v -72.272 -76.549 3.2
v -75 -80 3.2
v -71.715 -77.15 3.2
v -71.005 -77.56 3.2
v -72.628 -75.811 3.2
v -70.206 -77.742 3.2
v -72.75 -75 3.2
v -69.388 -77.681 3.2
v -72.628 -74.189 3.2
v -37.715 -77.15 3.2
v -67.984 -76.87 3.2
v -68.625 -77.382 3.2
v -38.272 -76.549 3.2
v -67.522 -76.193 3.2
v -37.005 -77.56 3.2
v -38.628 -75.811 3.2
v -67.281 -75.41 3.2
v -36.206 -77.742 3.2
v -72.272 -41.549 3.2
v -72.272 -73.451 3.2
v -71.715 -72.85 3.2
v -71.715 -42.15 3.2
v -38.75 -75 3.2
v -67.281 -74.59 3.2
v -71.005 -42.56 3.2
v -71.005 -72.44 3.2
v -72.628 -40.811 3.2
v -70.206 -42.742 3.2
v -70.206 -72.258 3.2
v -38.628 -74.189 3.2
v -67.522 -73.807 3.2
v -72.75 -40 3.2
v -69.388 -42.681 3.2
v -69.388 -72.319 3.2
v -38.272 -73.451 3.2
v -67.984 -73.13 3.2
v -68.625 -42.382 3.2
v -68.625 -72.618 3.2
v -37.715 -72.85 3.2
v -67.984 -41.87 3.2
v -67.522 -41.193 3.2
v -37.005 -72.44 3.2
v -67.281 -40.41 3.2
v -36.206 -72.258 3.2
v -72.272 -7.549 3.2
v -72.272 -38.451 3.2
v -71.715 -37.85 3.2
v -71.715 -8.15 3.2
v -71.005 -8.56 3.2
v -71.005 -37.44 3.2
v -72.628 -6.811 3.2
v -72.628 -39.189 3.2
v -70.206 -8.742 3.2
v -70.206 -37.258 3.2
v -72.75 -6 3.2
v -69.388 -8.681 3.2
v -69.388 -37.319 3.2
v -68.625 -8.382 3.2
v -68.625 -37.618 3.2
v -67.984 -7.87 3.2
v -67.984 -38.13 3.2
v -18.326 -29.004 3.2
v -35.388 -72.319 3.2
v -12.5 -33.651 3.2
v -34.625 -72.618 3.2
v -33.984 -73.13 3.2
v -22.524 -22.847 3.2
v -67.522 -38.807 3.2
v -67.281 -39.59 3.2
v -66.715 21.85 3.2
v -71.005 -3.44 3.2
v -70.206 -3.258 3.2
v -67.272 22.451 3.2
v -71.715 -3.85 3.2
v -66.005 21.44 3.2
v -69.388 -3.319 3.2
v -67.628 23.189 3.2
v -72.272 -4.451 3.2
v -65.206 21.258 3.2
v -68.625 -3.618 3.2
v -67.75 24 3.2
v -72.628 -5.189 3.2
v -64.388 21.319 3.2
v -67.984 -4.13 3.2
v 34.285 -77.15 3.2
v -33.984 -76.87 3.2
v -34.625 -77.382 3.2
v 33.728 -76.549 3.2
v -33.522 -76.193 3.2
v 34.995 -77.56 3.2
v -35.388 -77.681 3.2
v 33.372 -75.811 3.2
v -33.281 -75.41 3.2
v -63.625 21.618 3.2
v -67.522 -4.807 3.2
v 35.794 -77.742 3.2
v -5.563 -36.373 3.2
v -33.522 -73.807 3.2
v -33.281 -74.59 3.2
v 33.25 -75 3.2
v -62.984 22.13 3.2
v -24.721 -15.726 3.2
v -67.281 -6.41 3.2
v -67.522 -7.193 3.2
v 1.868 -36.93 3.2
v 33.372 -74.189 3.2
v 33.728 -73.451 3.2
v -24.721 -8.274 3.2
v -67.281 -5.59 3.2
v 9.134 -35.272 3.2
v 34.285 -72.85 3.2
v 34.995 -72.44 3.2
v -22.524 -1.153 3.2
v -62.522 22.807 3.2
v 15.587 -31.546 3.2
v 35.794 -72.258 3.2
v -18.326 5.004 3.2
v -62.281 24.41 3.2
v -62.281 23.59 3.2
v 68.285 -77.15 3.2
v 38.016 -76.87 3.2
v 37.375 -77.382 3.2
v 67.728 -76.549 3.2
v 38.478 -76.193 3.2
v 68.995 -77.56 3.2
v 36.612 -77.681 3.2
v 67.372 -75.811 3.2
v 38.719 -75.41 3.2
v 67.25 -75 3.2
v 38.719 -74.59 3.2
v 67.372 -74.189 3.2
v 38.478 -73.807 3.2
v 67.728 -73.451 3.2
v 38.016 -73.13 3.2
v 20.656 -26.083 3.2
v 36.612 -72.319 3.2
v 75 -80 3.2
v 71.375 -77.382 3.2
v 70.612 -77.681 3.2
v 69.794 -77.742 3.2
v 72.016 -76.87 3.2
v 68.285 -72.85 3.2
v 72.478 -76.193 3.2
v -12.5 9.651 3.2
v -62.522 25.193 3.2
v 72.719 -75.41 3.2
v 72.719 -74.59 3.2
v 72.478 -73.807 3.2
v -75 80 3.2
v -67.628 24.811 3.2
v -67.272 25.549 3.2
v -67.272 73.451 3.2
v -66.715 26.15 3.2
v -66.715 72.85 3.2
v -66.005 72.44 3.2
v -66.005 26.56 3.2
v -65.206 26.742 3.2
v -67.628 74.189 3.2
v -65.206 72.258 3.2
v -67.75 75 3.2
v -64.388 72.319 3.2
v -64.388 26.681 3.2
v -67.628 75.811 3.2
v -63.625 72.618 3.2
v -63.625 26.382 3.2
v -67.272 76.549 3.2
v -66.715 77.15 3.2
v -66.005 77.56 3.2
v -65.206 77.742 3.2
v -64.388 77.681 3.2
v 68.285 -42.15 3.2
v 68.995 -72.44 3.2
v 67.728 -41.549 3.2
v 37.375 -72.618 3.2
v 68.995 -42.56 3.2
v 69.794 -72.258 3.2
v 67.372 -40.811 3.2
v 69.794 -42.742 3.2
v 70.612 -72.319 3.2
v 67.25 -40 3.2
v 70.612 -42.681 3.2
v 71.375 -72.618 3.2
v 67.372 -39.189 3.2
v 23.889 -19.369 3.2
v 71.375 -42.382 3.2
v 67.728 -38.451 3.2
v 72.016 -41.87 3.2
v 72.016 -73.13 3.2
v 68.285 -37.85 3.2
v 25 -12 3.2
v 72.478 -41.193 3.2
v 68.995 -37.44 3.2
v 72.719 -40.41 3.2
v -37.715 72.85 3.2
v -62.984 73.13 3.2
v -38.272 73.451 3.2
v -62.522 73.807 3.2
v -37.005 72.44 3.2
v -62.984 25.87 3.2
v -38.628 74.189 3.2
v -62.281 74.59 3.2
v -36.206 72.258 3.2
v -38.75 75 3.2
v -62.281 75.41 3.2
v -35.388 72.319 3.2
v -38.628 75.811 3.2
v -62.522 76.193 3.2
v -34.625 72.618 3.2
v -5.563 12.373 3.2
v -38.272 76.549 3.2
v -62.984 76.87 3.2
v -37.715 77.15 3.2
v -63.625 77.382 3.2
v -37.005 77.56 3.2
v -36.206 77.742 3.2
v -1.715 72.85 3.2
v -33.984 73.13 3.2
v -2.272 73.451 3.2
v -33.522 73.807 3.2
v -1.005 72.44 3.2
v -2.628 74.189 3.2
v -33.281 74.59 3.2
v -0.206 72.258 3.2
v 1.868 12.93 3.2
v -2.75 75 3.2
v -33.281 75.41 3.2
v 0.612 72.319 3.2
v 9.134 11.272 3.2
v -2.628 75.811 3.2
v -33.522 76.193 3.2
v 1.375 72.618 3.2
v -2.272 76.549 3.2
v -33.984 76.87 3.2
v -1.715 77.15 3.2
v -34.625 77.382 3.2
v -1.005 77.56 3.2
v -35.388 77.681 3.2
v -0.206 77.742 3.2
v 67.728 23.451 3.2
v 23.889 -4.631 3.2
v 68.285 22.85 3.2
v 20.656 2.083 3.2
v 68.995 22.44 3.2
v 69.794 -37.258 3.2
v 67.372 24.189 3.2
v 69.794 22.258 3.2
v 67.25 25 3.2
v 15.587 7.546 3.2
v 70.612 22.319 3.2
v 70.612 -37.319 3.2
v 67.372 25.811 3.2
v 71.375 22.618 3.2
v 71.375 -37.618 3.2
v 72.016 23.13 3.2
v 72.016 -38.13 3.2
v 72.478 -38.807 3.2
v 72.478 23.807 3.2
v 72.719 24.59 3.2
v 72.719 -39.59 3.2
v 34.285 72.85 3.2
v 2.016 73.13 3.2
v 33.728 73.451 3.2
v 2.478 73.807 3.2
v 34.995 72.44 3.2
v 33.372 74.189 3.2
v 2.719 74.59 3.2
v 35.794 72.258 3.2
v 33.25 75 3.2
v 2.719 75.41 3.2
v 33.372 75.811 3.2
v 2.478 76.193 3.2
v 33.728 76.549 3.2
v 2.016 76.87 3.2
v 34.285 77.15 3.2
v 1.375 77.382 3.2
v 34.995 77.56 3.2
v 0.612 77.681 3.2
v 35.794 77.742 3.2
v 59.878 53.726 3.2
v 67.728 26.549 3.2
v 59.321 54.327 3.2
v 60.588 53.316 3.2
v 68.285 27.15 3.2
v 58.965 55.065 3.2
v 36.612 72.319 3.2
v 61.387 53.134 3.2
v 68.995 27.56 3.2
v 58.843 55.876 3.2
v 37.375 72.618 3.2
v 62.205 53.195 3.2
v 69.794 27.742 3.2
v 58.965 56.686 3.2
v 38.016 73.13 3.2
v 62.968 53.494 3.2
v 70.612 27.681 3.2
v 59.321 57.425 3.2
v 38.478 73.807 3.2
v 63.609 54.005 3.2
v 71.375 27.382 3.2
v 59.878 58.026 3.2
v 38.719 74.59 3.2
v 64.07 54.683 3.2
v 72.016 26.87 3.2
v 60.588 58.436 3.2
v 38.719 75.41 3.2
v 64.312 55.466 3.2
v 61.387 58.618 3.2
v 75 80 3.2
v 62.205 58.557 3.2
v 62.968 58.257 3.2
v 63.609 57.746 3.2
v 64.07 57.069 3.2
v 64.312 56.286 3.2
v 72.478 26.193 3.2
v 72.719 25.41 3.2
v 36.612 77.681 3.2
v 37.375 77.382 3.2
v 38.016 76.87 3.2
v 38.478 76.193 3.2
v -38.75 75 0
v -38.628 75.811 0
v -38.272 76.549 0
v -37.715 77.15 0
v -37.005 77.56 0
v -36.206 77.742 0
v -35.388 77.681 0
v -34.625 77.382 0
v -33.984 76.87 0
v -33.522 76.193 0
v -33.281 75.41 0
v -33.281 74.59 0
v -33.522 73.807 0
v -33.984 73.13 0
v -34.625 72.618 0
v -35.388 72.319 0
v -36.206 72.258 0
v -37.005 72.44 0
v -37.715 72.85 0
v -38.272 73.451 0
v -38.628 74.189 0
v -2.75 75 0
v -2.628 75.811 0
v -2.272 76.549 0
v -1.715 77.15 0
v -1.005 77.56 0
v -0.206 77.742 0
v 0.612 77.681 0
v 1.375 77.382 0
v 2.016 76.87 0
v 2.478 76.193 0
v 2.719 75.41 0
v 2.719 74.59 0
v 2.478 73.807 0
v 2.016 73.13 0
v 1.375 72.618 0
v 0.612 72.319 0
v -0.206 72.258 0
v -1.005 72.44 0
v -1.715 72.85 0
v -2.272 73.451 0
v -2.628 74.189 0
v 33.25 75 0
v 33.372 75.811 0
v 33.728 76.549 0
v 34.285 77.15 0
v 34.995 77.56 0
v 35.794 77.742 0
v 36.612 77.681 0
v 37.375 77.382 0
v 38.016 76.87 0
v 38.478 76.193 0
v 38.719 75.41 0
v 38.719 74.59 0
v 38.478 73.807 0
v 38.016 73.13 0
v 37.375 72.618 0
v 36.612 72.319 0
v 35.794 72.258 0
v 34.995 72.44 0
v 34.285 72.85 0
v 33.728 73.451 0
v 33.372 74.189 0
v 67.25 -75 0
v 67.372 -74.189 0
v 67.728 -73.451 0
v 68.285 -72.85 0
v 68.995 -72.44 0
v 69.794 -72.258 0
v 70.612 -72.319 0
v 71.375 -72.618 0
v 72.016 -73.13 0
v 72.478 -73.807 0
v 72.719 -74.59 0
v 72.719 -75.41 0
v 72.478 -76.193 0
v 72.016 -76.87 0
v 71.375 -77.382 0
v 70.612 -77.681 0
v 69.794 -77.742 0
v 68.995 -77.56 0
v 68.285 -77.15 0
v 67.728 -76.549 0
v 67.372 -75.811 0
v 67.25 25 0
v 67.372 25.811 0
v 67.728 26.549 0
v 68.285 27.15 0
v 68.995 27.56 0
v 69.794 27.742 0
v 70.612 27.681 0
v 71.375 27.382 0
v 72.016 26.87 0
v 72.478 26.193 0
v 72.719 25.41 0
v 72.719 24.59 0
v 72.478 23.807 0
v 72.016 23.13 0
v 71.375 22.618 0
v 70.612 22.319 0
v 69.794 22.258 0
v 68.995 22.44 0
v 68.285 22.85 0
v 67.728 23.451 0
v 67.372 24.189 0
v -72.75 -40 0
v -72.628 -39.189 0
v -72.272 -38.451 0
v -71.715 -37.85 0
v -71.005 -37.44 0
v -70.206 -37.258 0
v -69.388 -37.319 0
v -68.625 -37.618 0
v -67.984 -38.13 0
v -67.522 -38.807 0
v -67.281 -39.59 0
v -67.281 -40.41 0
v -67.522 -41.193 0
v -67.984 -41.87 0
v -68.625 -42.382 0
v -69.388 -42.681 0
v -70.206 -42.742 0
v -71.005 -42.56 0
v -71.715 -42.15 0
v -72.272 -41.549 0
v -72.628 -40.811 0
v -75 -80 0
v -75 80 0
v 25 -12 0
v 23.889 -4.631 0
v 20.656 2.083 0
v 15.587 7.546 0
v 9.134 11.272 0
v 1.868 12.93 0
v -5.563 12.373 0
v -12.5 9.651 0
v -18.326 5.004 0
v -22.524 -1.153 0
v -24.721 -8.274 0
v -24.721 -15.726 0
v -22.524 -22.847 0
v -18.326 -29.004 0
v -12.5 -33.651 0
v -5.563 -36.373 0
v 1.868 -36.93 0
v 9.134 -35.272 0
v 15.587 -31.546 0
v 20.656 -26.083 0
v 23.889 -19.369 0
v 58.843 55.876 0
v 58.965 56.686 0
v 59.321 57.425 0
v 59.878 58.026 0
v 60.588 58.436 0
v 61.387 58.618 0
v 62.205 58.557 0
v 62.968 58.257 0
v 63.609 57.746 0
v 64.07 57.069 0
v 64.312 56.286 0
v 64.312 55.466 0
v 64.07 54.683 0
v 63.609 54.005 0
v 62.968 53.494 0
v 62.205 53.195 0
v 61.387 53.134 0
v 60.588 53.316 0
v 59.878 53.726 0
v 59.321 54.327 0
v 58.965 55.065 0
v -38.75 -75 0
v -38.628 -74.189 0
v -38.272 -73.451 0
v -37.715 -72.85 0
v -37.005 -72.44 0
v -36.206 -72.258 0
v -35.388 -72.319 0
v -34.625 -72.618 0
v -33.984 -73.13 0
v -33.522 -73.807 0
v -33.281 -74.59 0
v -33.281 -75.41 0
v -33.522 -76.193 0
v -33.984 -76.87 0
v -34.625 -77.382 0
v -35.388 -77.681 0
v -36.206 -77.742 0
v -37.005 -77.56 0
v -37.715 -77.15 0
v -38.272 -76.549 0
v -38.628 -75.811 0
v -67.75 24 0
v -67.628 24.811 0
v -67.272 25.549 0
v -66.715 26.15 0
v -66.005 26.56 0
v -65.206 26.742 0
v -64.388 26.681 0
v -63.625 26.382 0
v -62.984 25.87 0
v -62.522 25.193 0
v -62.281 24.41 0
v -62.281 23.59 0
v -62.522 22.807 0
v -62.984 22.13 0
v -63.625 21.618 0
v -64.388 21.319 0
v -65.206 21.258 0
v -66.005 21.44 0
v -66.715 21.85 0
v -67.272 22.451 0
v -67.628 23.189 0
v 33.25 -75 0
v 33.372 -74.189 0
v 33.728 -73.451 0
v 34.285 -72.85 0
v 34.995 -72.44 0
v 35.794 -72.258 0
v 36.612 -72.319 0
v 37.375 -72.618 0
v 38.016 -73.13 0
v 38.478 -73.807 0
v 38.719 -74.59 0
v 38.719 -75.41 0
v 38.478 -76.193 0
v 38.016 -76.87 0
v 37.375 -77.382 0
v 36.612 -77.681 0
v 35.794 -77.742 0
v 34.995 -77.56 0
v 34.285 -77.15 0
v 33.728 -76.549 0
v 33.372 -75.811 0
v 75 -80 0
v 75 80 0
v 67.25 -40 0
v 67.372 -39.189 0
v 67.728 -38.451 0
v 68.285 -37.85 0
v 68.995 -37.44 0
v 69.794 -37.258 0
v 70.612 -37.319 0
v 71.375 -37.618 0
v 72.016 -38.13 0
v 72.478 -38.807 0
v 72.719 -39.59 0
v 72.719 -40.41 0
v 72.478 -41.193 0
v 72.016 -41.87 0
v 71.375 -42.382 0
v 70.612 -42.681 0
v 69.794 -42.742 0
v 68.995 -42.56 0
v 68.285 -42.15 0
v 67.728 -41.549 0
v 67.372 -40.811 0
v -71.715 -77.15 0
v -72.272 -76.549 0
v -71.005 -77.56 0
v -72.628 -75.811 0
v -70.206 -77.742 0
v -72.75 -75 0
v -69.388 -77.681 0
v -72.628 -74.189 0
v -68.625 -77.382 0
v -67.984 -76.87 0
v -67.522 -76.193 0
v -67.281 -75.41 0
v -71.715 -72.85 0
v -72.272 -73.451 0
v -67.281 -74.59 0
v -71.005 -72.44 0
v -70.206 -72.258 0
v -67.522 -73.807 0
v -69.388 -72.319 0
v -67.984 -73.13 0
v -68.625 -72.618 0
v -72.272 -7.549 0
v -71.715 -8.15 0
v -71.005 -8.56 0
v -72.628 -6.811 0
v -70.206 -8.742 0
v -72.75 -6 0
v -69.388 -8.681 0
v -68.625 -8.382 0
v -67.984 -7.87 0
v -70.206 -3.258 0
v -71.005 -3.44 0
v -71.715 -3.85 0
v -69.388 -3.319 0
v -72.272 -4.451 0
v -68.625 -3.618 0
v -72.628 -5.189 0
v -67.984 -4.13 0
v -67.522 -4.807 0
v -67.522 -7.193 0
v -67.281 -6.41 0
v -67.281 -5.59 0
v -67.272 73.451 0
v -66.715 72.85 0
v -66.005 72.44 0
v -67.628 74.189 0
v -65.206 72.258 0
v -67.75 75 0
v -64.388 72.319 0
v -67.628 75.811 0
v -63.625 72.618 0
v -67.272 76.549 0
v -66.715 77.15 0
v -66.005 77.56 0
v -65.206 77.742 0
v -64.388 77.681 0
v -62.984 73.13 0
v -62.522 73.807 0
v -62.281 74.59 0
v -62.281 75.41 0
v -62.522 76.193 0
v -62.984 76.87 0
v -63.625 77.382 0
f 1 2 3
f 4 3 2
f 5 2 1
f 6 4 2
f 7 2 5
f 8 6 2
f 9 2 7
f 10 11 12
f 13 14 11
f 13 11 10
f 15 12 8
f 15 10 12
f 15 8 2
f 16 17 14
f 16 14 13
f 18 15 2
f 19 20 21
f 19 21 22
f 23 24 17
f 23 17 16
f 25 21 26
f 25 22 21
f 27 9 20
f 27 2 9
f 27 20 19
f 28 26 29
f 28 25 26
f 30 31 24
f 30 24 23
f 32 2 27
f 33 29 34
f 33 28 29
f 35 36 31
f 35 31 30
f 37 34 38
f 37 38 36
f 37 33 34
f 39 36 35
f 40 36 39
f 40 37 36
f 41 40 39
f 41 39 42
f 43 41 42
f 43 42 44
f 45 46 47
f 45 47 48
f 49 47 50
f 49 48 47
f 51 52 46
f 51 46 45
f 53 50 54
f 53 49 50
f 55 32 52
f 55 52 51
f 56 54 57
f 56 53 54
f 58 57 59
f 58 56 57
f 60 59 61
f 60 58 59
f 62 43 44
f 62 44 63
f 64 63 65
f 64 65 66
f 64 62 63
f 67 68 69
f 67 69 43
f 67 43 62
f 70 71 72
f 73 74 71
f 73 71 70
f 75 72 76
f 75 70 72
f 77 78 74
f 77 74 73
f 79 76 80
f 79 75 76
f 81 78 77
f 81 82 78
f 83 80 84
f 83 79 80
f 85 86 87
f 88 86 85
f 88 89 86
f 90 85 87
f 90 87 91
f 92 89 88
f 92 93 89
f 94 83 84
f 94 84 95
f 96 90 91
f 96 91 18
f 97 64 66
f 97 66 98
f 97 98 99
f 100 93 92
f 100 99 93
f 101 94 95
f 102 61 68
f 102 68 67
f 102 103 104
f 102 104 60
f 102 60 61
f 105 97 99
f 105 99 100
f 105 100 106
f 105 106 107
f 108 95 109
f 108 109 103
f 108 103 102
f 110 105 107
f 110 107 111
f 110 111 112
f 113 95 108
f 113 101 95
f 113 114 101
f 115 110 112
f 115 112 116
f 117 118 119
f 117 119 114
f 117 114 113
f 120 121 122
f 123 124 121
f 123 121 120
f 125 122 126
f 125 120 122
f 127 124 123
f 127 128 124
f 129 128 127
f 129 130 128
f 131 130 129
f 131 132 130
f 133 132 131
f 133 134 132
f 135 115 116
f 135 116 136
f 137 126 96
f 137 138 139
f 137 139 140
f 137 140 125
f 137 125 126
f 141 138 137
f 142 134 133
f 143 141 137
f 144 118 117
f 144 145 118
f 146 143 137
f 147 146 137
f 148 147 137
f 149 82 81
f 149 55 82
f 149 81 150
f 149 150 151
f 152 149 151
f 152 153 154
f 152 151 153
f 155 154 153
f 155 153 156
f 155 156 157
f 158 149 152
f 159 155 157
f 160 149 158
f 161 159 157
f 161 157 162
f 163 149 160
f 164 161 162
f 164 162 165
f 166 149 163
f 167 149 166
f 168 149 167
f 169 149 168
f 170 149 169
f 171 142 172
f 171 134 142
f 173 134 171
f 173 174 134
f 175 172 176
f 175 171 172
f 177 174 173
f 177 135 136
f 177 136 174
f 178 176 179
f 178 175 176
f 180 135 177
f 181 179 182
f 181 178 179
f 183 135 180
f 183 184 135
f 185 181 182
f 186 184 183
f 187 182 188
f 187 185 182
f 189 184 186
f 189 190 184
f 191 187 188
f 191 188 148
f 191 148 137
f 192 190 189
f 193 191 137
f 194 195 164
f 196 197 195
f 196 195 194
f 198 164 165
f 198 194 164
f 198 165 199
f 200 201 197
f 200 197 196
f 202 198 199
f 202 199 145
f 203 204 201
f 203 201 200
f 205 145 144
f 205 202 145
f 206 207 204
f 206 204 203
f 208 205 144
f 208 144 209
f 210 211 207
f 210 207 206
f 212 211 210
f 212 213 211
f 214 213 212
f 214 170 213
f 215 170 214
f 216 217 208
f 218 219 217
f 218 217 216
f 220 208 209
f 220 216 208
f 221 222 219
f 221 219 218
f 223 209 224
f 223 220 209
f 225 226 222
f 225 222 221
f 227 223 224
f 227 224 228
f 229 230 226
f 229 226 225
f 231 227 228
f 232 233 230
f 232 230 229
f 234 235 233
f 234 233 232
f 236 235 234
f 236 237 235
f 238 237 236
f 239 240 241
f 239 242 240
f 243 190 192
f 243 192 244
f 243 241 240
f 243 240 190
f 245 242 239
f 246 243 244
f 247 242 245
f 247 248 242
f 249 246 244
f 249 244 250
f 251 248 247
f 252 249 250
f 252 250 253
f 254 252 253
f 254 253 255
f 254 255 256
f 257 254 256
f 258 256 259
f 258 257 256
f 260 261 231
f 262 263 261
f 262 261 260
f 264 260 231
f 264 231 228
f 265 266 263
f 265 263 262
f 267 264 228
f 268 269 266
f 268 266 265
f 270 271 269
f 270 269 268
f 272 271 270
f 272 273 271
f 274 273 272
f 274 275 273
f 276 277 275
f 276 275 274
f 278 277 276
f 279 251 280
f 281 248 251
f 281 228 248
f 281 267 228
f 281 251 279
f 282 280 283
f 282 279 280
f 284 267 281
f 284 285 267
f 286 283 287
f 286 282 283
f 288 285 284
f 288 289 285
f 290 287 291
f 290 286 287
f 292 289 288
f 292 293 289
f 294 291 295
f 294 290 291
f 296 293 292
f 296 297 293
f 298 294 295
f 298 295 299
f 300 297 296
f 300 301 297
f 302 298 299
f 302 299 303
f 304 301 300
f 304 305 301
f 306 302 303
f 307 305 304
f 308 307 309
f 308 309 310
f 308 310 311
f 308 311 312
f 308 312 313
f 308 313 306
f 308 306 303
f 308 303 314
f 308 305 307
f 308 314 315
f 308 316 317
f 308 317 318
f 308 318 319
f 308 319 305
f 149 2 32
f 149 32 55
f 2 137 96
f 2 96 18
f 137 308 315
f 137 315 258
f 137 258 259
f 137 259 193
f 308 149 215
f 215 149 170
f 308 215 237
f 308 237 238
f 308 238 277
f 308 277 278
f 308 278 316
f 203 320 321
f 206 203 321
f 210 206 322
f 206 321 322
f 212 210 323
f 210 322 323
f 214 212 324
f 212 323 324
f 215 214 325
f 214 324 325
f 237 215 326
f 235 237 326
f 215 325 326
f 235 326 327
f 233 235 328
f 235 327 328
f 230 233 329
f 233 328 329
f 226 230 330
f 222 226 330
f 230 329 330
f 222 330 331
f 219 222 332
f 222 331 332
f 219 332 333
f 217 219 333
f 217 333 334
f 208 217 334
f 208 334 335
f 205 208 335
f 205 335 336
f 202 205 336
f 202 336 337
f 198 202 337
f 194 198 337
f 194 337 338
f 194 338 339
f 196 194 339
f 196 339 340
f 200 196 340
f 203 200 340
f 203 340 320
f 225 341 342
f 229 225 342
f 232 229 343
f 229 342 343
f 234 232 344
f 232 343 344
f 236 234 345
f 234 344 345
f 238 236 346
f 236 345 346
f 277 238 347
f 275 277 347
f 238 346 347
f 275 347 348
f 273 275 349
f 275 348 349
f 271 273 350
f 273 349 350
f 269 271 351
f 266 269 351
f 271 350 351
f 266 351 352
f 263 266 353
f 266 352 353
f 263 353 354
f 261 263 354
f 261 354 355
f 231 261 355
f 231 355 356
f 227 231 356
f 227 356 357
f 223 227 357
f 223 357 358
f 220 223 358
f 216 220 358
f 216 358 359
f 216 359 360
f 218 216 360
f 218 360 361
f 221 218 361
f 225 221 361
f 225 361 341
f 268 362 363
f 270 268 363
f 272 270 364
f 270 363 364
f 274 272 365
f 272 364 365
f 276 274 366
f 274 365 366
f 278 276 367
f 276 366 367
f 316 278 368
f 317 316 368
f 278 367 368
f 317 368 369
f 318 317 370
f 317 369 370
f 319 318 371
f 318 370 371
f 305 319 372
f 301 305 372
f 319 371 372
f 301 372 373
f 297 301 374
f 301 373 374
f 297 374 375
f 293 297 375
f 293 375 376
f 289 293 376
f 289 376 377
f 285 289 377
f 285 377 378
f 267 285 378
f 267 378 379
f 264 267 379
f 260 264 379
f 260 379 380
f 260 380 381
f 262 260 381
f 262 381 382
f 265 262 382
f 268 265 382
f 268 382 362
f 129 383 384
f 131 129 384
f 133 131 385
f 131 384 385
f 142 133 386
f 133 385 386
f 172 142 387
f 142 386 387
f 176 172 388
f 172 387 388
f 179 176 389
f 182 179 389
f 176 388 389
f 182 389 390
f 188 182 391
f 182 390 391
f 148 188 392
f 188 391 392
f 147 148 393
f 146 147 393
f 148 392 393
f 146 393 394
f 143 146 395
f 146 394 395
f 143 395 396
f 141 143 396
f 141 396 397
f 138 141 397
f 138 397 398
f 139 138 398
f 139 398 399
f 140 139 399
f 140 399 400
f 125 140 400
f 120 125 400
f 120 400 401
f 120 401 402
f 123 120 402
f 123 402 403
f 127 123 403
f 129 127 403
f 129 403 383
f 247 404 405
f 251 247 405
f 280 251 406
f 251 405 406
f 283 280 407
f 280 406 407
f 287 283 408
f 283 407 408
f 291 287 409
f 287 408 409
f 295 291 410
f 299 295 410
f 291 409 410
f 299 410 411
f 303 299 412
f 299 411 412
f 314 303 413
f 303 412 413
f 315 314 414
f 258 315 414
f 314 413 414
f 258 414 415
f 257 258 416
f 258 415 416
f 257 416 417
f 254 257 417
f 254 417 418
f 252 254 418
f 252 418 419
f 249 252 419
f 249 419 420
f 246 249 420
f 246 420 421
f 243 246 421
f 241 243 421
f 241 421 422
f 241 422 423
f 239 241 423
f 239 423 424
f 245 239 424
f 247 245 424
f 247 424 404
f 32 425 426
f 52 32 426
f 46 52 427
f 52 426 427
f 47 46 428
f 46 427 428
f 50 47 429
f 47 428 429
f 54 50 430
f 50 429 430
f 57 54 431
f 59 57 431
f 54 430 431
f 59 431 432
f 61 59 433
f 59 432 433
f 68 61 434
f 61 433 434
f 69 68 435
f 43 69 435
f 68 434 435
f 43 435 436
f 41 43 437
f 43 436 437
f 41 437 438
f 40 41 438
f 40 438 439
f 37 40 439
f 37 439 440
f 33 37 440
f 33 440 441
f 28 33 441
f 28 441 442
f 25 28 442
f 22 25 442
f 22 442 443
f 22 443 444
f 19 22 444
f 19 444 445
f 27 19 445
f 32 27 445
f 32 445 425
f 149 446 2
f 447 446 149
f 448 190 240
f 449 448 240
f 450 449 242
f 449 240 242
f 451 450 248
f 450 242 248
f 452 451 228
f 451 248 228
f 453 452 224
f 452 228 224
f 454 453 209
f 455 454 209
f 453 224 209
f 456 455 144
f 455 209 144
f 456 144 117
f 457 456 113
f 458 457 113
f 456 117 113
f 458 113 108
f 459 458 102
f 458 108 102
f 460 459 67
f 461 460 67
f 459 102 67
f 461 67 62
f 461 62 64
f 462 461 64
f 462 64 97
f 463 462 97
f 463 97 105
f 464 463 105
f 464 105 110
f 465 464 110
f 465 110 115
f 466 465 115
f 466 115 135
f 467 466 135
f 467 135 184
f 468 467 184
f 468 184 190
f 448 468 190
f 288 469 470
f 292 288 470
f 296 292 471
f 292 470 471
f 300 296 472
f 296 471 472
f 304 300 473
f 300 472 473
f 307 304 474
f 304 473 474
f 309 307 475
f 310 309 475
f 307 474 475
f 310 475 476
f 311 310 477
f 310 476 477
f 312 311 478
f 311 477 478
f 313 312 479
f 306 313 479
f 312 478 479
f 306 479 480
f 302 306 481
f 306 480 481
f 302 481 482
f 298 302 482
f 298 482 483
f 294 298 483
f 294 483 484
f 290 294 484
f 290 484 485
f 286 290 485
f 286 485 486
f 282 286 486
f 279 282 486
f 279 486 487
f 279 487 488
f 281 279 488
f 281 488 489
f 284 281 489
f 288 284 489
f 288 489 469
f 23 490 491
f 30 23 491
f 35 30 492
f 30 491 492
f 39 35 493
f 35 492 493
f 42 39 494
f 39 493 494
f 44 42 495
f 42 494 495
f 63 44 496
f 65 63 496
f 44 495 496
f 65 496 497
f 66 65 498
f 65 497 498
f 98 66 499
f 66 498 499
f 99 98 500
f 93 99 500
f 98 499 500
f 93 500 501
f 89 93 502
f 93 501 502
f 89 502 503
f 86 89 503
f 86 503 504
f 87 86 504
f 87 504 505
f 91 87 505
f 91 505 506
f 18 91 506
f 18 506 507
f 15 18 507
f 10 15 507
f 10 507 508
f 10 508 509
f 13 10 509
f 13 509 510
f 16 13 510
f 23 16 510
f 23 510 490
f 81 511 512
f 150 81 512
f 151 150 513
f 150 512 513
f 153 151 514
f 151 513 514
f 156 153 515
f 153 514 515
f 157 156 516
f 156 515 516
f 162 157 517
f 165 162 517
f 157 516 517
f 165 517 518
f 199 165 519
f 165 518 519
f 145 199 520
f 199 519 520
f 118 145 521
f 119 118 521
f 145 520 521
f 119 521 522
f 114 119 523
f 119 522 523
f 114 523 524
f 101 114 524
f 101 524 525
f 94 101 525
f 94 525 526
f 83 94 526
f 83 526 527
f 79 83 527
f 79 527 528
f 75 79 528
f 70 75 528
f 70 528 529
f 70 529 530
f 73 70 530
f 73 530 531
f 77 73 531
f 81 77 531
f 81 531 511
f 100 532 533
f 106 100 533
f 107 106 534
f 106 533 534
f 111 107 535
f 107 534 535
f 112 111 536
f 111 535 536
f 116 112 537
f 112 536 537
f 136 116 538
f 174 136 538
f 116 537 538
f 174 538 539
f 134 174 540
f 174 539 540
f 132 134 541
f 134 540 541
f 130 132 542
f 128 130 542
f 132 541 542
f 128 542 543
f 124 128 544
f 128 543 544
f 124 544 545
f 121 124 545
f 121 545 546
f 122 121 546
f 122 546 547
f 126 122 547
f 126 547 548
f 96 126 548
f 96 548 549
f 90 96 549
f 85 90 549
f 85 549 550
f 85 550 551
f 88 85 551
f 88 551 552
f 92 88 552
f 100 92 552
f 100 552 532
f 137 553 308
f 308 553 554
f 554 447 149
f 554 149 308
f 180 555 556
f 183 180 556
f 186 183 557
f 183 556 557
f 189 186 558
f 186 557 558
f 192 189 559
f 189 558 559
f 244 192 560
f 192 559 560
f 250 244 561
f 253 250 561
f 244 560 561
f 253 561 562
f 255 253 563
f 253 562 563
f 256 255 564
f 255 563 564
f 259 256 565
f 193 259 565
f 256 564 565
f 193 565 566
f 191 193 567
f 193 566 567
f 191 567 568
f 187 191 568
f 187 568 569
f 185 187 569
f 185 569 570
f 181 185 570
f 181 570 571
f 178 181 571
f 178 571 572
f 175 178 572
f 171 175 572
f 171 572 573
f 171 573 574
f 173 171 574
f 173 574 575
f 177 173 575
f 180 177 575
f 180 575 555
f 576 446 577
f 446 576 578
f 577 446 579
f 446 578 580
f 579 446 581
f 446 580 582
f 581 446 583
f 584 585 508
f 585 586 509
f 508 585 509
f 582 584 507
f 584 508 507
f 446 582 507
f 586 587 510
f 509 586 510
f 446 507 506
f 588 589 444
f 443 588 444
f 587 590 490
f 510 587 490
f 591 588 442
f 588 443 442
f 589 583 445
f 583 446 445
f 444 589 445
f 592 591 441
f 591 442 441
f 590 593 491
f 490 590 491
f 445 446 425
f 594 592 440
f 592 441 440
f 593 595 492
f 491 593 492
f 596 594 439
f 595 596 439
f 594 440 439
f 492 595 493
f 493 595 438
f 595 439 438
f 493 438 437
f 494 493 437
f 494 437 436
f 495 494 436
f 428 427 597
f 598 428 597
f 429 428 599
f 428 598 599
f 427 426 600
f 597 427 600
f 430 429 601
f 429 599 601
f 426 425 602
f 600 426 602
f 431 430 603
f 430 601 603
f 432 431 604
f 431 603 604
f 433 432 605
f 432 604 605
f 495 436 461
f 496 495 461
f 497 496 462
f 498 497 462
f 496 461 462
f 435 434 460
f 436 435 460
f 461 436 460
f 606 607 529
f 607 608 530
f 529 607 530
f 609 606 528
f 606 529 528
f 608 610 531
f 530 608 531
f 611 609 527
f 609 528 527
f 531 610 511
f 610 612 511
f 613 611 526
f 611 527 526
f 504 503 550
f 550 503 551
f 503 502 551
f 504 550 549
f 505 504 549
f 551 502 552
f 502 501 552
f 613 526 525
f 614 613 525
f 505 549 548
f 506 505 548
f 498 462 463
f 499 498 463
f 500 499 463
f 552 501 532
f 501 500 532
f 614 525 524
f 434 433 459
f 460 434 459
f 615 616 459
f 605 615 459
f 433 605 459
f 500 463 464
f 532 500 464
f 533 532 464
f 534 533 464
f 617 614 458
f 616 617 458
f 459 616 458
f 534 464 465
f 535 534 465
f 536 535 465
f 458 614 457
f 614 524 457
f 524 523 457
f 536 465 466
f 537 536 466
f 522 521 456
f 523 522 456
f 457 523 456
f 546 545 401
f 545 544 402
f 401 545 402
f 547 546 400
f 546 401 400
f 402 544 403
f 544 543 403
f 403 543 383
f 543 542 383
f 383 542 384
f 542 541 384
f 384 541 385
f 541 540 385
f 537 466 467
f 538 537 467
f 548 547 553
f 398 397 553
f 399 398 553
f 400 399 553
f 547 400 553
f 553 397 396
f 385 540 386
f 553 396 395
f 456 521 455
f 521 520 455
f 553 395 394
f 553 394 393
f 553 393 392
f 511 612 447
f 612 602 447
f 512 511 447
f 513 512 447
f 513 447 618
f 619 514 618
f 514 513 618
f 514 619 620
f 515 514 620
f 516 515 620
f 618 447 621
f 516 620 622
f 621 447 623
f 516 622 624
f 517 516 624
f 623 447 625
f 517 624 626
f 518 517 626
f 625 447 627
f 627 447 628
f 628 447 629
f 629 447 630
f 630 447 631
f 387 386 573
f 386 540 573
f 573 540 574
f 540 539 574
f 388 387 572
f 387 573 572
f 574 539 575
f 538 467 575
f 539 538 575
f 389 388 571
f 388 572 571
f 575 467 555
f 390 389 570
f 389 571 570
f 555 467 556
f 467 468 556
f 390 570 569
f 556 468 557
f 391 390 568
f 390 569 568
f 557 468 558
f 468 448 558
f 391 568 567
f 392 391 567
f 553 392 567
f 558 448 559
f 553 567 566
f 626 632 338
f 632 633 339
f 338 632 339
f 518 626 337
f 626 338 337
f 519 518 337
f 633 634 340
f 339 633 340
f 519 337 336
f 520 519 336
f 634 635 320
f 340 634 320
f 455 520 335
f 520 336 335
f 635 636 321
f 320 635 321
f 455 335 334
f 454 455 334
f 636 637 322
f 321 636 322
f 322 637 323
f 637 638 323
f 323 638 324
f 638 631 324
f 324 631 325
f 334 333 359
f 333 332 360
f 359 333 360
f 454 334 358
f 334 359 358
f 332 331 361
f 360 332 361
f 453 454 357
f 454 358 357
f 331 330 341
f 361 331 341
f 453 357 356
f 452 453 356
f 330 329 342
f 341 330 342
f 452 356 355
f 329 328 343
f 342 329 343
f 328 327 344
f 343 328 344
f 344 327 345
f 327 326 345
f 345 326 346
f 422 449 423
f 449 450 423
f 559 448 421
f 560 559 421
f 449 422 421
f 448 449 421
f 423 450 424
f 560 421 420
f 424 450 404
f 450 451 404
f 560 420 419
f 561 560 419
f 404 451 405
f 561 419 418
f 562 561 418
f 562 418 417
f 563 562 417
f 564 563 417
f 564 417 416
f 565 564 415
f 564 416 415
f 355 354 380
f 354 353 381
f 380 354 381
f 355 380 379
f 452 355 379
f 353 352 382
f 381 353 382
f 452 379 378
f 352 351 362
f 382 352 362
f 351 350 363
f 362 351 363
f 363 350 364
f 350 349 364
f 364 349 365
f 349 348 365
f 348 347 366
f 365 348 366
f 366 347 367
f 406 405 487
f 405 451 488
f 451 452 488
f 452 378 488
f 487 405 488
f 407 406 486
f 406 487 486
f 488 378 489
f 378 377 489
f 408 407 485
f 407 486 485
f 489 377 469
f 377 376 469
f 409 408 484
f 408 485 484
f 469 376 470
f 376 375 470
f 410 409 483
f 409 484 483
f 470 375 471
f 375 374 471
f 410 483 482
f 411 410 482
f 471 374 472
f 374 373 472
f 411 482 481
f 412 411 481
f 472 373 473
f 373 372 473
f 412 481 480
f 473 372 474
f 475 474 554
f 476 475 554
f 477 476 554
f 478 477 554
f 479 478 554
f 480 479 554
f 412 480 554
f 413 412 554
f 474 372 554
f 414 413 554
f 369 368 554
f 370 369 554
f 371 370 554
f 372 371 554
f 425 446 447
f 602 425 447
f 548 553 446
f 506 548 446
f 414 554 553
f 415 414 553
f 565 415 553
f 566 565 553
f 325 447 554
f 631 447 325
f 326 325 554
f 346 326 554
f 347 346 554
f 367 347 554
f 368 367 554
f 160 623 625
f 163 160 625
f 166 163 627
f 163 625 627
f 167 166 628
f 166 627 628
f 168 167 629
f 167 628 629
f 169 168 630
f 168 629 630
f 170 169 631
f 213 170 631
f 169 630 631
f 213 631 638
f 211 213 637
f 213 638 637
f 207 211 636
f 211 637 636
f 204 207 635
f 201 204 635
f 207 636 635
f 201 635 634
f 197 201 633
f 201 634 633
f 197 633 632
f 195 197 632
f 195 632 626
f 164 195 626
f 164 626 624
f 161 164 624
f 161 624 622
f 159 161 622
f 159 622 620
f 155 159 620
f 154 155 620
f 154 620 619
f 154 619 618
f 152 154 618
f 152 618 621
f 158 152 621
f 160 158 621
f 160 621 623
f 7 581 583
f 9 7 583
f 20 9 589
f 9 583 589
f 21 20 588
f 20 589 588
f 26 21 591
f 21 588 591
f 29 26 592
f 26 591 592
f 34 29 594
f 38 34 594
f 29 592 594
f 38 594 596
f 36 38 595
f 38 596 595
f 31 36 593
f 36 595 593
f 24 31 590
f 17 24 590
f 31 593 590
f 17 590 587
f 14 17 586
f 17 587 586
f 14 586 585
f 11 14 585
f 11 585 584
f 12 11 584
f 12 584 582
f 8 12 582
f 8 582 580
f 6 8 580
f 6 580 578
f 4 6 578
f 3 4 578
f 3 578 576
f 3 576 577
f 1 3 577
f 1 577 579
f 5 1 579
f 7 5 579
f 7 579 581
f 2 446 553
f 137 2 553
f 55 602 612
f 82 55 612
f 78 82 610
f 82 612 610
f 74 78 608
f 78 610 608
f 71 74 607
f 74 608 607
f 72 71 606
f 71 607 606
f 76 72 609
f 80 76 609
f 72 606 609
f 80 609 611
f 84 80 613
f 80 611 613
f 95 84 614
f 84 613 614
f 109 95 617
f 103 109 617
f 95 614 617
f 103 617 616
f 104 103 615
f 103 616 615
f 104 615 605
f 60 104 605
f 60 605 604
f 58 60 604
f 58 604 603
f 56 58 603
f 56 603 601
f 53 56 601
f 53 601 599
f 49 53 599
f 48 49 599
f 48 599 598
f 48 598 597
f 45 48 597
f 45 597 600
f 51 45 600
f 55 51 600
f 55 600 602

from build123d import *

# Parameters (mm, degrees)
SKETCH1_W           = 150
SKETCH1_H           = 160
BOSS_EXTRUDE1_DEPTH = 3.2
CUT_EXTRUDE1_REACH  = 5.2
SKETCH2_R           = 25
CUT_EXTRUDE2_REACH  = 5.2
SKETCH3_R           = 2.75


with BuildPart() as part:
    # Sketch1 → Boss-Extrude1 (new body)
    with BuildSketch(Plane.XY):
        Rectangle(SKETCH1_W, SKETCH1_H)
    extrude(amount=BOSS_EXTRUDE1_DEPTH)

    # Sketch2 → Cut-Extrude1 (cut, up to next)
    with BuildSketch(Plane.XY.offset(3.2), mode=Mode.PRIVATE) as cut_extrude1_sk1:
        with Locations((0, -12)):
            Circle(SKETCH2_R)
    cut_extrude1_tool1 = extrude(cut_extrude1_sk1.sketch, amount=-CUT_EXTRUDE1_REACH, mode=Mode.PRIVATE) & part.part
    add(cut_extrude1_tool1.solids().sort_by_distance((0, -12, 3.2))[0], mode=Mode.SUBTRACT)

    # Sketch3 → Cut-Extrude2 (cut, up to next)
    with BuildSketch(Plane(origin=(0, 0, 0), x_dir=(-1, 0, 0), z_dir=(0, 0, -1)), mode=Mode.PRIVATE) as cut_extrude2_sk1:
        with Locations((65, 24)):
            Circle(SKETCH3_R)
    cut_extrude2_tool1 = extrude(cut_extrude2_sk1.sketch, amount=-CUT_EXTRUDE2_REACH, mode=Mode.PRIVATE) & part.part
    add(cut_extrude2_tool1.solids().sort_by_distance((-65, 24, 0))[0], mode=Mode.SUBTRACT)
    # Sketch3 → Cut-Extrude2 (cut, up to next)
    with BuildSketch(Plane(origin=(0, 0, 0), x_dir=(-1, 0, 0), z_dir=(0, 0, -1)), mode=Mode.PRIVATE) as cut_extrude2_sk2:
        with Locations((-70, -75)):
            Circle(SKETCH3_R)
    cut_extrude2_tool2 = extrude(cut_extrude2_sk2.sketch, amount=-CUT_EXTRUDE2_REACH, mode=Mode.PRIVATE) & part.part
    add(cut_extrude2_tool2.solids().sort_by_distance((70, -75, 0))[0], mode=Mode.SUBTRACT)
    # Sketch3 → Cut-Extrude2 (cut, up to next)
    with BuildSketch(Plane(origin=(0, 0, 0), x_dir=(-1, 0, 0), z_dir=(0, 0, -1)), mode=Mode.PRIVATE) as cut_extrude2_sk3:
        with Locations((36, -75)):
            Circle(SKETCH3_R)
    cut_extrude2_tool3 = extrude(cut_extrude2_sk3.sketch, amount=-CUT_EXTRUDE2_REACH, mode=Mode.PRIVATE) & part.part
    add(cut_extrude2_tool3.solids().sort_by_distance((-36, -75, 0))[0], mode=Mode.SUBTRACT)
    # Sketch3 → Cut-Extrude2 (cut, up to next)
    with BuildSketch(Plane(origin=(0, 0, 0), x_dir=(-1, 0, 0), z_dir=(0, 0, -1)), mode=Mode.PRIVATE) as cut_extrude2_sk4:
        with Locations((-36, -75)):
            Circle(SKETCH3_R)
    cut_extrude2_tool4 = extrude(cut_extrude2_sk4.sketch, amount=-CUT_EXTRUDE2_REACH, mode=Mode.PRIVATE) & part.part
    add(cut_extrude2_tool4.solids().sort_by_distance((36, -75, 0))[0], mode=Mode.SUBTRACT)
    # Sketch3 → Cut-Extrude2 (cut, up to next)
    with BuildSketch(Plane(origin=(0, 0, 0), x_dir=(-1, 0, 0), z_dir=(0, 0, -1)), mode=Mode.PRIVATE) as cut_extrude2_sk5:
        with Locations((70, -75)):
            Circle(SKETCH3_R)
    cut_extrude2_tool5 = extrude(cut_extrude2_sk5.sketch, amount=-CUT_EXTRUDE2_REACH, mode=Mode.PRIVATE) & part.part
    add(cut_extrude2_tool5.solids().sort_by_distance((-70, -75, 0))[0], mode=Mode.SUBTRACT)
    # Sketch3 → Cut-Extrude2 (cut, up to next)
    with BuildSketch(Plane(origin=(0, 0, 0), x_dir=(-1, 0, 0), z_dir=(0, 0, -1)), mode=Mode.PRIVATE) as cut_extrude2_sk6:
        with Locations((-70, -40)):
            Circle(SKETCH3_R)
    cut_extrude2_tool6 = extrude(cut_extrude2_sk6.sketch, amount=-CUT_EXTRUDE2_REACH, mode=Mode.PRIVATE) & part.part
    add(cut_extrude2_tool6.solids().sort_by_distance((70, -40, 0))[0], mode=Mode.SUBTRACT)
    # Sketch3 → Cut-Extrude2 (cut, up to next)
    with BuildSketch(Plane(origin=(0, 0, 0), x_dir=(-1, 0, 0), z_dir=(0, 0, -1)), mode=Mode.PRIVATE) as cut_extrude2_sk7:
        with Locations((-70, 25)):
            Circle(SKETCH3_R)
    cut_extrude2_tool7 = extrude(cut_extrude2_sk7.sketch, amount=-CUT_EXTRUDE2_REACH, mode=Mode.PRIVATE) & part.part
    add(cut_extrude2_tool7.solids().sort_by_distance((70, 25, 0))[0], mode=Mode.SUBTRACT)
    # Sketch3 → Cut-Extrude2 (cut, up to next)
    with BuildSketch(Plane(origin=(0, 0, 0), x_dir=(-1, 0, 0), z_dir=(0, 0, -1)), mode=Mode.PRIVATE) as cut_extrude2_sk8:
        with Locations((-36, 75)):
            Circle(SKETCH3_R)
    cut_extrude2_tool8 = extrude(cut_extrude2_sk8.sketch, amount=-CUT_EXTRUDE2_REACH, mode=Mode.PRIVATE) & part.part
    add(cut_extrude2_tool8.solids().sort_by_distance((36, 75, 0))[0], mode=Mode.SUBTRACT)
    # Sketch3 → Cut-Extrude2 (cut, up to next)
    with BuildSketch(Plane(origin=(0, 0, 0), x_dir=(-1, 0, 0), z_dir=(0, 0, -1)), mode=Mode.PRIVATE) as cut_extrude2_sk9:
        with Locations((36, 75)):
            Circle(SKETCH3_R)
    cut_extrude2_tool9 = extrude(cut_extrude2_sk9.sketch, amount=-CUT_EXTRUDE2_REACH, mode=Mode.PRIVATE) & part.part
    add(cut_extrude2_tool9.solids().sort_by_distance((-36, 75, 0))[0], mode=Mode.SUBTRACT)
    # Sketch3 → Cut-Extrude2 (cut, up to next)
    with BuildSketch(Plane(origin=(0, 0, 0), x_dir=(-1, 0, 0), z_dir=(0, 0, -1)), mode=Mode.PRIVATE) as cut_extrude2_sk10:
        with Locations((65, 75)):
            Circle(SKETCH3_R)
    cut_extrude2_tool10 = extrude(cut_extrude2_sk10.sketch, amount=-CUT_EXTRUDE2_REACH, mode=Mode.PRIVATE) & part.part
    add(cut_extrude2_tool10.solids().sort_by_distance((-65, 75, 0))[0], mode=Mode.SUBTRACT)
    # Sketch3 → Cut-Extrude2 (cut, up to next)
    with BuildSketch(Plane(origin=(0, 0, 0), x_dir=(-1, 0, 0), z_dir=(0, 0, -1)), mode=Mode.PRIVATE) as cut_extrude2_sk11:
        with Locations((70, -40)):
            Circle(SKETCH3_R)
    cut_extrude2_tool11 = extrude(cut_extrude2_sk11.sketch, amount=-CUT_EXTRUDE2_REACH, mode=Mode.PRIVATE) & part.part
    add(cut_extrude2_tool11.solids().sort_by_distance((-70, -40, 0))[0], mode=Mode.SUBTRACT)
    # Sketch3 → Cut-Extrude2 (cut, up to next)
    with BuildSketch(Plane(origin=(0, 0, 0), x_dir=(-1, 0, 0), z_dir=(0, 0, -1)), mode=Mode.PRIVATE) as cut_extrude2_sk12:
        with Locations((70, -6)):
            Circle(SKETCH3_R)
    cut_extrude2_tool12 = extrude(cut_extrude2_sk12.sketch, amount=-CUT_EXTRUDE2_REACH, mode=Mode.PRIVATE) & part.part
    add(cut_extrude2_tool12.solids().sort_by_distance((-70, -6, 0))[0], mode=Mode.SUBTRACT)
    # Sketch3 → Cut-Extrude2 (cut, up to next)
    with BuildSketch(Plane(origin=(0, 0, 0), x_dir=(-1, 0, 0), z_dir=(0, 0, -1)), mode=Mode.PRIVATE) as cut_extrude2_sk13:
        with Locations((0, 75)):
            Circle(SKETCH3_R)
    cut_extrude2_tool13 = extrude(cut_extrude2_sk13.sketch, amount=-CUT_EXTRUDE2_REACH, mode=Mode.PRIVATE) & part.part
    add(cut_extrude2_tool13.solids().sort_by_distance((0, 75, 0))[0], mode=Mode.SUBTRACT)
    # Sketch3 → Cut-Extrude2 (cut, up to next)
    with BuildSketch(Plane(origin=(0, 0, 0), x_dir=(-1, 0, 0), z_dir=(0, 0, -1)), mode=Mode.PRIVATE) as cut_extrude2_sk14:
        with Locations((-61.592770869, 55.875856237)):
            Circle(SKETCH3_R)
    cut_extrude2_tool14 = extrude(cut_extrude2_sk14.sketch, amount=-CUT_EXTRUDE2_REACH, mode=Mode.PRIVATE) & part.part
    add(cut_extrude2_tool14.solids().sort_by_distance((61.592771, 55.875856, 0))[0], mode=Mode.SUBTRACT)


solid = part.part
